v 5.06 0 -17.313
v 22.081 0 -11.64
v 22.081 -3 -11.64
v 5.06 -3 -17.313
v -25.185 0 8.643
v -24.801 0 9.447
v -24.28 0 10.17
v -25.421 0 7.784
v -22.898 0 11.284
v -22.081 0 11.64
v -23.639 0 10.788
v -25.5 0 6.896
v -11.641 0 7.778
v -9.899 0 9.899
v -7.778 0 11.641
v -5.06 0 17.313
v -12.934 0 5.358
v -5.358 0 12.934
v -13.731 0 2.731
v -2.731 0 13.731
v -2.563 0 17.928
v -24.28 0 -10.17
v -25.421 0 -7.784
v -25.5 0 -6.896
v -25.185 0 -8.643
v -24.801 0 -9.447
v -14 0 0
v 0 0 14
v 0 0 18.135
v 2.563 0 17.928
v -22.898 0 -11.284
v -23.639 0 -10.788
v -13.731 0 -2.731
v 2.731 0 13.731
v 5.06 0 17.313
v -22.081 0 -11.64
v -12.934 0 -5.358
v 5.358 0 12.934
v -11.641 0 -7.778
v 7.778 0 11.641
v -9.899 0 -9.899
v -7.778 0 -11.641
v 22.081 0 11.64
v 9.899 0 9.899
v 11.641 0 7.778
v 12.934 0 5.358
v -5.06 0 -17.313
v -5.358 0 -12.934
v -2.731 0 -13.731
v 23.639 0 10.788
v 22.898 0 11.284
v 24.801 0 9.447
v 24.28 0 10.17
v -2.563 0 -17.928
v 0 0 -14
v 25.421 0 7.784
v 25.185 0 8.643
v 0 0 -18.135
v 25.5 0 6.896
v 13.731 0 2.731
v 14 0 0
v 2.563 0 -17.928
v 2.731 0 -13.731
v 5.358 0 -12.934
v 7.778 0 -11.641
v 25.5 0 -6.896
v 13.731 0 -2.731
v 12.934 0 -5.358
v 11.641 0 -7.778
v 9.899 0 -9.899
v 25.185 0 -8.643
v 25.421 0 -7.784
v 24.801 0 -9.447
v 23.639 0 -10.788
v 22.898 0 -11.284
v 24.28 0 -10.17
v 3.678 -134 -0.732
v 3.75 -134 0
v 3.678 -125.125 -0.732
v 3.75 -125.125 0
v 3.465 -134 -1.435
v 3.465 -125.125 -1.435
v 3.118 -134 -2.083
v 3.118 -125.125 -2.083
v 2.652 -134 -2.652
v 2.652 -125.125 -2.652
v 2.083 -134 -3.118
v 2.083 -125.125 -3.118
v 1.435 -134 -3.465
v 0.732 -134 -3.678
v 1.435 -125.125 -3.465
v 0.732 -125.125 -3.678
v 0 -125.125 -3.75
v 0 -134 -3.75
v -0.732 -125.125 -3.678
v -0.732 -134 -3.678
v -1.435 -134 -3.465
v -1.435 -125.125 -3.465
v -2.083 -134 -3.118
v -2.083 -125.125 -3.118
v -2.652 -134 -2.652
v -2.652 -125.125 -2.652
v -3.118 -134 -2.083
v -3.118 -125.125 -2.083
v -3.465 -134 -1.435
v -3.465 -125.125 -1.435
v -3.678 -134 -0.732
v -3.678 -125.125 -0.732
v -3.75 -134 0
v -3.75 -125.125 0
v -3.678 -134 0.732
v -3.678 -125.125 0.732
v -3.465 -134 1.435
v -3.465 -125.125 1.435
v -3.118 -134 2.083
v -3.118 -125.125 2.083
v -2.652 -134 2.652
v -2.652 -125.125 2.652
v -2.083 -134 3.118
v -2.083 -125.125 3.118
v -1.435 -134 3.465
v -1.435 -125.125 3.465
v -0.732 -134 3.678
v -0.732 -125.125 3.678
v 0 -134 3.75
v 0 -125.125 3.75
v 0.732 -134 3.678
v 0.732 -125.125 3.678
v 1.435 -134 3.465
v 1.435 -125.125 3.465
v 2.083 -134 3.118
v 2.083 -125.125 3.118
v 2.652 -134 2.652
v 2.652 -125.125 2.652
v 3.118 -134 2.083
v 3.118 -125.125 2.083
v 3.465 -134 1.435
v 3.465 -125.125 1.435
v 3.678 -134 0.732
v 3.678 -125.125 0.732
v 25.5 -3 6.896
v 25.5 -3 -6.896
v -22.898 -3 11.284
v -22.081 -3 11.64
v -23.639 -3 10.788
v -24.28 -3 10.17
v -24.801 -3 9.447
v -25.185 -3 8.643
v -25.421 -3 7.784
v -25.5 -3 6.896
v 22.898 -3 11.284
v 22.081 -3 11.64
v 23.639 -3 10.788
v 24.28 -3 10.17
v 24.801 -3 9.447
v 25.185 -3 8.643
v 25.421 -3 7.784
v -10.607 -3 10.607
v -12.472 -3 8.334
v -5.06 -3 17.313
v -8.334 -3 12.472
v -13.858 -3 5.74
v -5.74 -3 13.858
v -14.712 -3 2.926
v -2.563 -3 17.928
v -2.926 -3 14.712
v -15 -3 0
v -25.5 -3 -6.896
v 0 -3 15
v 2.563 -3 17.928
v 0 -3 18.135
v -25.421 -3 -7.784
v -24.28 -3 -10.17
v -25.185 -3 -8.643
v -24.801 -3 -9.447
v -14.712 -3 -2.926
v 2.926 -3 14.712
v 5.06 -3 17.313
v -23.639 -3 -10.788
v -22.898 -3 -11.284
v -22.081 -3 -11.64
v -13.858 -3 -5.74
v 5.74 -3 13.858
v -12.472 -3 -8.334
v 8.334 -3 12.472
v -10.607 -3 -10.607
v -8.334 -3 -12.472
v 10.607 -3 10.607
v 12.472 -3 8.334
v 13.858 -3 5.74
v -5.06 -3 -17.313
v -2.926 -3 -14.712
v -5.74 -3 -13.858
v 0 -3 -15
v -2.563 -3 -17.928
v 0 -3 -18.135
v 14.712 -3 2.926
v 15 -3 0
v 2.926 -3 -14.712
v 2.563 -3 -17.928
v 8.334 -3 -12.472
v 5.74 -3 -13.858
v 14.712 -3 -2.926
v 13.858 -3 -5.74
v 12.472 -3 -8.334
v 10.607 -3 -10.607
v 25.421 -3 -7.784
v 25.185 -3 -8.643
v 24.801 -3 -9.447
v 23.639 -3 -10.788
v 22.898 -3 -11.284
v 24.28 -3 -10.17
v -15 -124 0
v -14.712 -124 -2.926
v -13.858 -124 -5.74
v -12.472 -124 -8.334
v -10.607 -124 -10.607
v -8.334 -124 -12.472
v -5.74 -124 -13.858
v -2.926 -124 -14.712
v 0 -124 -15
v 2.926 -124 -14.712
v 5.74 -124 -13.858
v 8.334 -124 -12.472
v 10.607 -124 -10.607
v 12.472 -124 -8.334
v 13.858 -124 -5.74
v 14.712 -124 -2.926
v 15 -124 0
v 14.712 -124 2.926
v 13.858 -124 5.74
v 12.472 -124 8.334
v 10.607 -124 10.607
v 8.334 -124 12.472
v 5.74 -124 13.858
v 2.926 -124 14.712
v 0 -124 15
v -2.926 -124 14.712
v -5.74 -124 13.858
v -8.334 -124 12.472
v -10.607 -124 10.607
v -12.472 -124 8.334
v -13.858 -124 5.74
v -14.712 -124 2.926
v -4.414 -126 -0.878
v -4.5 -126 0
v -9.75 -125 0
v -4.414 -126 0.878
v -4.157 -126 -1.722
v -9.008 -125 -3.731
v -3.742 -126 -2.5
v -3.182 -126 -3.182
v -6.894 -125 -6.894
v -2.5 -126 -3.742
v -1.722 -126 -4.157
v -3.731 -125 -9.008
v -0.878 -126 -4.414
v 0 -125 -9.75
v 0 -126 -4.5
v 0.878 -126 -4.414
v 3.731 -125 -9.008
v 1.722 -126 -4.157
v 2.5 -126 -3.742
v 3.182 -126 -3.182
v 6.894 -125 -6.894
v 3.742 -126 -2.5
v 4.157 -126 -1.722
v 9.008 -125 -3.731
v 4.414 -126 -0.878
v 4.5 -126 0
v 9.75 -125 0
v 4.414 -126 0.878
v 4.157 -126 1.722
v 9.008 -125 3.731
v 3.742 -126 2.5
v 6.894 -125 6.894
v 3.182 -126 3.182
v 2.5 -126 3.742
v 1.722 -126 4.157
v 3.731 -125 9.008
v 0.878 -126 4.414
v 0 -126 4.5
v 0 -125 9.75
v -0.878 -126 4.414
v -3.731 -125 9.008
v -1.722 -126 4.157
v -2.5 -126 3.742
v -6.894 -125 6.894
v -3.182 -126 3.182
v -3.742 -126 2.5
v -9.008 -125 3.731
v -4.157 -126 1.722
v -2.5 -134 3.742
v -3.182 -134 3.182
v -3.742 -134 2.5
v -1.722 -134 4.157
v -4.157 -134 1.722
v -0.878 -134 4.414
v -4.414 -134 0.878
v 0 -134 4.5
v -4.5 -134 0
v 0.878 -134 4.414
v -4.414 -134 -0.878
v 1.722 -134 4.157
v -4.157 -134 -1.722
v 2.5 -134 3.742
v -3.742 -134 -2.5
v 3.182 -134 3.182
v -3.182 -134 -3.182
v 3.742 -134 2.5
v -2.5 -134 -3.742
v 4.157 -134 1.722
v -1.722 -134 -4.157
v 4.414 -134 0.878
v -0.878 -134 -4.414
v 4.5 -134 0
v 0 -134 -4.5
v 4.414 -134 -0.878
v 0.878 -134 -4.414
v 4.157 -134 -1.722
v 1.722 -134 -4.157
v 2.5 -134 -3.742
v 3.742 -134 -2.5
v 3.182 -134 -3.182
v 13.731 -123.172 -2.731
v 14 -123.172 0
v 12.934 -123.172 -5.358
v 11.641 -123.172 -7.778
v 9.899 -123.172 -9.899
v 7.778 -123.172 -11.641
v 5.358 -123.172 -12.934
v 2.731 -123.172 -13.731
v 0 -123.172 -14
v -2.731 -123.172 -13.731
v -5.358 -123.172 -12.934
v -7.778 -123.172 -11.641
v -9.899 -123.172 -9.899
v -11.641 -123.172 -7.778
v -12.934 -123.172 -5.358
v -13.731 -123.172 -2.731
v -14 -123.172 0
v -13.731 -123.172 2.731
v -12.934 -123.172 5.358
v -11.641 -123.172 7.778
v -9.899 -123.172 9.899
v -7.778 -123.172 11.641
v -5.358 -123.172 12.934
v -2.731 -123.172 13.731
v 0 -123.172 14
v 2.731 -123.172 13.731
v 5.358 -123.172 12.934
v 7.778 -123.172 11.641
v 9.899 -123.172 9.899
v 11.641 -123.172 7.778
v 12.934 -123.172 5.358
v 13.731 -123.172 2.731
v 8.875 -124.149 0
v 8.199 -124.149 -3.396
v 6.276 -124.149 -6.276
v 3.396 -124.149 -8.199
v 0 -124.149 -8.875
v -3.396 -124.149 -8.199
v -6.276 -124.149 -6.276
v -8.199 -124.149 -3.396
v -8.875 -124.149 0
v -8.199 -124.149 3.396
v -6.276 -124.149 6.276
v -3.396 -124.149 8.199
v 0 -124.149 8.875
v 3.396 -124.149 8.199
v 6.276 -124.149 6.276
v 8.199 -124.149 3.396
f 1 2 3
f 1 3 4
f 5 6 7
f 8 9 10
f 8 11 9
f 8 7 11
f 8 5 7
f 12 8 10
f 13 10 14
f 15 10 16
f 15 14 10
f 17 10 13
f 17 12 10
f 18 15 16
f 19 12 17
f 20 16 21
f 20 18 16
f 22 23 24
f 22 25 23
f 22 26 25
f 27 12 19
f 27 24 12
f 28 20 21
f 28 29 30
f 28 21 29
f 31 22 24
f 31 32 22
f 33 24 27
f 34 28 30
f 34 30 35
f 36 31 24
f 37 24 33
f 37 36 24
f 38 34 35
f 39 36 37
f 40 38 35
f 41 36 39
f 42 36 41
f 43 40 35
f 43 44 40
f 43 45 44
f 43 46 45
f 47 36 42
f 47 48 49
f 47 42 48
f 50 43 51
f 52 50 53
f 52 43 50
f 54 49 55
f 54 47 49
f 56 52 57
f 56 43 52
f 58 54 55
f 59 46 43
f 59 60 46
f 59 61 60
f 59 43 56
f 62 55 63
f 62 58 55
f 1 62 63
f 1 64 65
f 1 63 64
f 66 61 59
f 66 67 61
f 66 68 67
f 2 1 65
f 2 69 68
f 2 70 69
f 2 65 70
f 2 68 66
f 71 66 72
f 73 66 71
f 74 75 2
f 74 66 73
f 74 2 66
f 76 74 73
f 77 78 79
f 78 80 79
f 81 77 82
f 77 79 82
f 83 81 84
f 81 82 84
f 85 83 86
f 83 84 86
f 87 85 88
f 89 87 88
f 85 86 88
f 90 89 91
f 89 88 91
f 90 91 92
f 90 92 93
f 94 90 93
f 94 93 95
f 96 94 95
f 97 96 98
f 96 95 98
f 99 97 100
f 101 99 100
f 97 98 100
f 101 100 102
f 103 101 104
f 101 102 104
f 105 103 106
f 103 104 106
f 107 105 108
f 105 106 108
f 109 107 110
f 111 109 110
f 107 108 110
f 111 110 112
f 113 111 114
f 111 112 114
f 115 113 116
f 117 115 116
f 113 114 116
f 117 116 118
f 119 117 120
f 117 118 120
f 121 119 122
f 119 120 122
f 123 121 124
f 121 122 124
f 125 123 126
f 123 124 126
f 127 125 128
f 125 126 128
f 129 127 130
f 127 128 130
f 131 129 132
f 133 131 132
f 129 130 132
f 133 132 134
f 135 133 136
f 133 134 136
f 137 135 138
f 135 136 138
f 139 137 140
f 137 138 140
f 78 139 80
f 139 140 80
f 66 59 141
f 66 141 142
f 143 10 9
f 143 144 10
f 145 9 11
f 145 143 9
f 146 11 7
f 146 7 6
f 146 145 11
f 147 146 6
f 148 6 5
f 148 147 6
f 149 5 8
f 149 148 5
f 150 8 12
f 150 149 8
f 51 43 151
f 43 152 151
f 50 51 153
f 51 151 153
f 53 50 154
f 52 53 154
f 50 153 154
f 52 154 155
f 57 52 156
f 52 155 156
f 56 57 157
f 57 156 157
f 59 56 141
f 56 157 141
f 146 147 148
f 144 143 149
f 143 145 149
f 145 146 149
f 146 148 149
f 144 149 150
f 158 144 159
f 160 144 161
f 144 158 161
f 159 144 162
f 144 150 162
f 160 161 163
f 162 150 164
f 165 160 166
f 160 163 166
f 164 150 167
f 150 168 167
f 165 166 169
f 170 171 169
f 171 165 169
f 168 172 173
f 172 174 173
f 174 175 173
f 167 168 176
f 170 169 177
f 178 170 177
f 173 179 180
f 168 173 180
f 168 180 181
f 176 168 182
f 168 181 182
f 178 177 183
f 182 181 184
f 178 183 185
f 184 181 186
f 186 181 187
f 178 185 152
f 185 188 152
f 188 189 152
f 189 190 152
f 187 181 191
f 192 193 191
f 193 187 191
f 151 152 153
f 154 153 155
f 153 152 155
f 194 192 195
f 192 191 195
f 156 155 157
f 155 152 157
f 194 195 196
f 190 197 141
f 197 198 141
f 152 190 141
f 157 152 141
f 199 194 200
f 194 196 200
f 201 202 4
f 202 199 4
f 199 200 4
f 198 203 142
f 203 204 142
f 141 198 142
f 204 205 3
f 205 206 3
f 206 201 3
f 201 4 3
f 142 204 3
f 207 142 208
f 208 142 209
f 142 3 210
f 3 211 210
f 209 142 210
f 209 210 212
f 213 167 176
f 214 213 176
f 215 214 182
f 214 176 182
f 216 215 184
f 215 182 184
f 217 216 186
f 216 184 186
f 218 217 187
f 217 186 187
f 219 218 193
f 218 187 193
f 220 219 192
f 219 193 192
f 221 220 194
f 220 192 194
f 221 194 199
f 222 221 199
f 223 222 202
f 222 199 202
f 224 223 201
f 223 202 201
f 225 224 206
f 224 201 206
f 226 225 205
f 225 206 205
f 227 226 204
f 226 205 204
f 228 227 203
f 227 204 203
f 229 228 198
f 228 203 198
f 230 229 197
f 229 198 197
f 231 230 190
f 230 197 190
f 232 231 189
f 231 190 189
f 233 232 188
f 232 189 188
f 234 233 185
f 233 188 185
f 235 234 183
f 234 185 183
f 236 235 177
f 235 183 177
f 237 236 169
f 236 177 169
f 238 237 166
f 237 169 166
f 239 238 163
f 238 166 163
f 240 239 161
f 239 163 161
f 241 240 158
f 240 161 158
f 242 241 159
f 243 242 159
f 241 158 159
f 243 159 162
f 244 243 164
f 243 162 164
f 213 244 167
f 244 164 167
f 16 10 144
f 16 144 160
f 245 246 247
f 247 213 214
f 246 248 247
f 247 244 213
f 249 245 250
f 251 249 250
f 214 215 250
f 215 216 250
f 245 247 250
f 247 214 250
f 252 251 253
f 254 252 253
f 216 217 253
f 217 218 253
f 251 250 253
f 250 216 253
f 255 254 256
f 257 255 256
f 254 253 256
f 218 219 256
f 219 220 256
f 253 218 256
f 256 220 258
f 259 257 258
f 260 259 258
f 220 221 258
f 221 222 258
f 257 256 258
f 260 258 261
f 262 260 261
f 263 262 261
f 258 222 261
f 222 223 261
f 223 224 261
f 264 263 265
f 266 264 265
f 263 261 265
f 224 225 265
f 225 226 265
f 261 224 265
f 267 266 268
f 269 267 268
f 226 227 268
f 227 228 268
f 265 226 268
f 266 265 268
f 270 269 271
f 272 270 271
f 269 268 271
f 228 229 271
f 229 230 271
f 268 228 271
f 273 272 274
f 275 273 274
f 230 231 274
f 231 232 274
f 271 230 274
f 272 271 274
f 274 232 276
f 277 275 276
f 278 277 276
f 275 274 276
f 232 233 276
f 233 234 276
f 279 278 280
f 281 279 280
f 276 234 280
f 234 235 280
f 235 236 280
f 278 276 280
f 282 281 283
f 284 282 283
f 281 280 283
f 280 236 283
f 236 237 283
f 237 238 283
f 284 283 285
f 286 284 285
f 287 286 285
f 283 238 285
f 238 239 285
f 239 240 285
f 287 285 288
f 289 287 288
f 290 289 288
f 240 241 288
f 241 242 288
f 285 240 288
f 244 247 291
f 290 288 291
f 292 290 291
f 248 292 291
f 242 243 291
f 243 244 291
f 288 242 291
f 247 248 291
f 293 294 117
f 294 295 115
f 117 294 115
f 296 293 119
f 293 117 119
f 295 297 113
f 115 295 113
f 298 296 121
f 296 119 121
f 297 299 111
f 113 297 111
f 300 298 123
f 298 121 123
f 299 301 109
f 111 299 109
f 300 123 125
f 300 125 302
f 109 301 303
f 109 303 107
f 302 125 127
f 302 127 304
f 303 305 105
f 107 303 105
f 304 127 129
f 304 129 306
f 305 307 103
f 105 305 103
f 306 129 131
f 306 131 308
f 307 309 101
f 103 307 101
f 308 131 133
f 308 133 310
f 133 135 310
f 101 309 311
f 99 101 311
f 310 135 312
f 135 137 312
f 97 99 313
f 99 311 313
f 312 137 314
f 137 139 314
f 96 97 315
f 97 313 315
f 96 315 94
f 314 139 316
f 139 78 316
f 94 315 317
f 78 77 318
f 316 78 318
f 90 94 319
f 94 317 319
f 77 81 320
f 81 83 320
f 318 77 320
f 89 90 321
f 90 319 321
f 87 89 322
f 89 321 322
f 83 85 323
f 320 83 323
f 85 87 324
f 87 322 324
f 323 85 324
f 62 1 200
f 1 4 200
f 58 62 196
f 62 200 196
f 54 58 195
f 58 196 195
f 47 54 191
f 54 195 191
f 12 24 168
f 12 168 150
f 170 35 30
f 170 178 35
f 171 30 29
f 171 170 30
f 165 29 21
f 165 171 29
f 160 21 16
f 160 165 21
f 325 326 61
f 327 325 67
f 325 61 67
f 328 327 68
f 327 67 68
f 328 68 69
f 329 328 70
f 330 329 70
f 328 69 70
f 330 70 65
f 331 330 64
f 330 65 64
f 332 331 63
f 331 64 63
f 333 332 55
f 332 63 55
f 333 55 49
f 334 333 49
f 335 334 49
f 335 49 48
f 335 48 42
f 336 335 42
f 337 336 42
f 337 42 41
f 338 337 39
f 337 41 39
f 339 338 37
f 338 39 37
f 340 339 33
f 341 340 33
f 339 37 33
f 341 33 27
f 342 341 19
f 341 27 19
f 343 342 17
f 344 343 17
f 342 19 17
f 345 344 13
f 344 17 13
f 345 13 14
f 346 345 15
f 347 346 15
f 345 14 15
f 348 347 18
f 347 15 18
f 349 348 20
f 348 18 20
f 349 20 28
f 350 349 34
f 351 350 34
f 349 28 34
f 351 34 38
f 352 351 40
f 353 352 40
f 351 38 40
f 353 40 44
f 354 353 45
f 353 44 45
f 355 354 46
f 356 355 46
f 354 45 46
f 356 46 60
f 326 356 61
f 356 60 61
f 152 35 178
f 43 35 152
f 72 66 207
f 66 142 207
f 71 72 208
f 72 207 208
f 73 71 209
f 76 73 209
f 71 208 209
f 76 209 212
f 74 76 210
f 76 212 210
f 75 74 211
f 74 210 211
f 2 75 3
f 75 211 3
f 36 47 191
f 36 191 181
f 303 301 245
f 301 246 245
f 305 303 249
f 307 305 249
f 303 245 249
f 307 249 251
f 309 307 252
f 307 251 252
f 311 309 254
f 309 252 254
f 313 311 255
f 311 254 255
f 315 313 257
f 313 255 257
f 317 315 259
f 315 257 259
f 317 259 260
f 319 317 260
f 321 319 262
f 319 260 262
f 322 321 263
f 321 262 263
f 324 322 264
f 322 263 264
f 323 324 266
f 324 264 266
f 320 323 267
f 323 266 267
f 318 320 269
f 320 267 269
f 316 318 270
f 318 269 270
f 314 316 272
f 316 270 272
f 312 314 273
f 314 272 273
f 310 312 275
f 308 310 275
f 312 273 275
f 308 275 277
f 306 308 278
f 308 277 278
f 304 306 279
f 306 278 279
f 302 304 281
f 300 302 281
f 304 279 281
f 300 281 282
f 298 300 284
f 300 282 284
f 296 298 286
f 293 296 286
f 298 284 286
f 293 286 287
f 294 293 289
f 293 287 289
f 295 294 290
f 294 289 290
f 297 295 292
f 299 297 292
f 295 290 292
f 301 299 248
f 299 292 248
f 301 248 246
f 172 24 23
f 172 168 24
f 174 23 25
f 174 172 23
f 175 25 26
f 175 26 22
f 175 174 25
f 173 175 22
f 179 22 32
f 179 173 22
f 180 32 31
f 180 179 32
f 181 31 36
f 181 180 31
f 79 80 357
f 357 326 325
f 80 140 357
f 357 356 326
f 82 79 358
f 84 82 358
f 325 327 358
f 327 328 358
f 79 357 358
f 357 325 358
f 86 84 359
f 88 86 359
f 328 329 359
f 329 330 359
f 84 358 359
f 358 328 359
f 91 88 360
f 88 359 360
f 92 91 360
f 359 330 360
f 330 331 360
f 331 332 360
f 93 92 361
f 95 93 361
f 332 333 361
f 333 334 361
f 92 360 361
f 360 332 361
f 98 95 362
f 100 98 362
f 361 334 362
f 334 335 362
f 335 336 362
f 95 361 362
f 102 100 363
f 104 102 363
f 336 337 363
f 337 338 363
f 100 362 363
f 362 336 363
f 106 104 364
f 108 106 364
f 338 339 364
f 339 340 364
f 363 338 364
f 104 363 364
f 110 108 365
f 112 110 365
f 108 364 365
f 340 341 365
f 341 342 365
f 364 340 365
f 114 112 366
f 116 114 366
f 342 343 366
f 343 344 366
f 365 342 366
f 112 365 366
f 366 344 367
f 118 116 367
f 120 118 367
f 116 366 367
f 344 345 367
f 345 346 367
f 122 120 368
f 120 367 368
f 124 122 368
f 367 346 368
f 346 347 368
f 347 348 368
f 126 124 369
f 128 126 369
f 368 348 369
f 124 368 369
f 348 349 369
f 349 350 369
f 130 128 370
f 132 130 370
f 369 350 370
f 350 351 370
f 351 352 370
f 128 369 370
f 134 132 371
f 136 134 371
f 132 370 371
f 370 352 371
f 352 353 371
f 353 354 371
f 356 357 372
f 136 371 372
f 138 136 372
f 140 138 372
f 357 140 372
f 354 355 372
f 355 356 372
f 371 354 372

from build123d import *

# Parameters (mm, degrees)
SKIZZE1_R                       = 15
AUFSATZ_LINEAR_AUSTRAGEN1_DEPTH = 3
VERRUNDUNG1_R                   = 16
VERRUNDUNG2_R                   = 5


# Read off the part's stored shape, not the designer's step: Wandung1
with BuildPart() as part:
    # Skizze2 → Rotation1 (revolve)
    with BuildSketch(Plane.XY, mode=Mode.PRIVATE) as rotation1_sk:
        Polygon((0, -134), (4.5, -134), (4.5, -126), (15, -124), (15, 0), (0, 0), align=None)
    revolve(rotation1_sk.sketch.rotate(Axis((0, 0, 0), (0, -1, 0)), 180), axis=Axis((0, 0, 0), (0, -1, 0)))

    # Wandung1 outline → Wandung1 (revolve, cut)
    with BuildSketch(Plane.XY):
        Polygon((0, -134), (3.75, -134), (3.75, -125.124878175), (14, -123.172497223), (14, 0), (0, 0), align=None)
    revolve(axis=Axis((0, 0, 0), (0, 1, 0)), mode=Mode.SUBTRACT)

    # Skizze1 → Aufsatz-Linear austragen1 (add)
    with BuildSketch(Plane(origin=(0, 0, 0), x_dir=(1, 0, 0), z_dir=(0, 1, 0))):
        Polygon((0, -19), (25.5, -10.5), (25.5, 10.5), (0, 19), (-25.5, 10.5), (-25.5, -10.5), align=None)
        with Locations(Location((0, 0, 0), (0, 0, 180))):
            Circle(SKIZZE1_R, mode=Mode.SUBTRACT)
    extrude(amount=-AUFSATZ_LINEAR_AUSTRAGEN1_DEPTH)

    # Verrundung1
    verrundung1_edges = [part.edges().sort_by_distance(p)[0] for p in [
        (0, -1.5, 19),
        (0, -1.5, -19),
    ]]
    fillet(verrundung1_edges, radius=VERRUNDUNG1_R)

    # Verrundung2
    verrundung2_edges = [part.edges().sort_by_distance(p)[0] for p in [
        (-25.5, -1.5, 10.5),
        (-25.5, -1.5, -10.5),
        (25.5, -1.5, -10.5),
        (25.5, -1.5, 10.5),
    ]]
    fillet(verrundung2_edges, radius=VERRUNDUNG2_R)


solid = part.part
